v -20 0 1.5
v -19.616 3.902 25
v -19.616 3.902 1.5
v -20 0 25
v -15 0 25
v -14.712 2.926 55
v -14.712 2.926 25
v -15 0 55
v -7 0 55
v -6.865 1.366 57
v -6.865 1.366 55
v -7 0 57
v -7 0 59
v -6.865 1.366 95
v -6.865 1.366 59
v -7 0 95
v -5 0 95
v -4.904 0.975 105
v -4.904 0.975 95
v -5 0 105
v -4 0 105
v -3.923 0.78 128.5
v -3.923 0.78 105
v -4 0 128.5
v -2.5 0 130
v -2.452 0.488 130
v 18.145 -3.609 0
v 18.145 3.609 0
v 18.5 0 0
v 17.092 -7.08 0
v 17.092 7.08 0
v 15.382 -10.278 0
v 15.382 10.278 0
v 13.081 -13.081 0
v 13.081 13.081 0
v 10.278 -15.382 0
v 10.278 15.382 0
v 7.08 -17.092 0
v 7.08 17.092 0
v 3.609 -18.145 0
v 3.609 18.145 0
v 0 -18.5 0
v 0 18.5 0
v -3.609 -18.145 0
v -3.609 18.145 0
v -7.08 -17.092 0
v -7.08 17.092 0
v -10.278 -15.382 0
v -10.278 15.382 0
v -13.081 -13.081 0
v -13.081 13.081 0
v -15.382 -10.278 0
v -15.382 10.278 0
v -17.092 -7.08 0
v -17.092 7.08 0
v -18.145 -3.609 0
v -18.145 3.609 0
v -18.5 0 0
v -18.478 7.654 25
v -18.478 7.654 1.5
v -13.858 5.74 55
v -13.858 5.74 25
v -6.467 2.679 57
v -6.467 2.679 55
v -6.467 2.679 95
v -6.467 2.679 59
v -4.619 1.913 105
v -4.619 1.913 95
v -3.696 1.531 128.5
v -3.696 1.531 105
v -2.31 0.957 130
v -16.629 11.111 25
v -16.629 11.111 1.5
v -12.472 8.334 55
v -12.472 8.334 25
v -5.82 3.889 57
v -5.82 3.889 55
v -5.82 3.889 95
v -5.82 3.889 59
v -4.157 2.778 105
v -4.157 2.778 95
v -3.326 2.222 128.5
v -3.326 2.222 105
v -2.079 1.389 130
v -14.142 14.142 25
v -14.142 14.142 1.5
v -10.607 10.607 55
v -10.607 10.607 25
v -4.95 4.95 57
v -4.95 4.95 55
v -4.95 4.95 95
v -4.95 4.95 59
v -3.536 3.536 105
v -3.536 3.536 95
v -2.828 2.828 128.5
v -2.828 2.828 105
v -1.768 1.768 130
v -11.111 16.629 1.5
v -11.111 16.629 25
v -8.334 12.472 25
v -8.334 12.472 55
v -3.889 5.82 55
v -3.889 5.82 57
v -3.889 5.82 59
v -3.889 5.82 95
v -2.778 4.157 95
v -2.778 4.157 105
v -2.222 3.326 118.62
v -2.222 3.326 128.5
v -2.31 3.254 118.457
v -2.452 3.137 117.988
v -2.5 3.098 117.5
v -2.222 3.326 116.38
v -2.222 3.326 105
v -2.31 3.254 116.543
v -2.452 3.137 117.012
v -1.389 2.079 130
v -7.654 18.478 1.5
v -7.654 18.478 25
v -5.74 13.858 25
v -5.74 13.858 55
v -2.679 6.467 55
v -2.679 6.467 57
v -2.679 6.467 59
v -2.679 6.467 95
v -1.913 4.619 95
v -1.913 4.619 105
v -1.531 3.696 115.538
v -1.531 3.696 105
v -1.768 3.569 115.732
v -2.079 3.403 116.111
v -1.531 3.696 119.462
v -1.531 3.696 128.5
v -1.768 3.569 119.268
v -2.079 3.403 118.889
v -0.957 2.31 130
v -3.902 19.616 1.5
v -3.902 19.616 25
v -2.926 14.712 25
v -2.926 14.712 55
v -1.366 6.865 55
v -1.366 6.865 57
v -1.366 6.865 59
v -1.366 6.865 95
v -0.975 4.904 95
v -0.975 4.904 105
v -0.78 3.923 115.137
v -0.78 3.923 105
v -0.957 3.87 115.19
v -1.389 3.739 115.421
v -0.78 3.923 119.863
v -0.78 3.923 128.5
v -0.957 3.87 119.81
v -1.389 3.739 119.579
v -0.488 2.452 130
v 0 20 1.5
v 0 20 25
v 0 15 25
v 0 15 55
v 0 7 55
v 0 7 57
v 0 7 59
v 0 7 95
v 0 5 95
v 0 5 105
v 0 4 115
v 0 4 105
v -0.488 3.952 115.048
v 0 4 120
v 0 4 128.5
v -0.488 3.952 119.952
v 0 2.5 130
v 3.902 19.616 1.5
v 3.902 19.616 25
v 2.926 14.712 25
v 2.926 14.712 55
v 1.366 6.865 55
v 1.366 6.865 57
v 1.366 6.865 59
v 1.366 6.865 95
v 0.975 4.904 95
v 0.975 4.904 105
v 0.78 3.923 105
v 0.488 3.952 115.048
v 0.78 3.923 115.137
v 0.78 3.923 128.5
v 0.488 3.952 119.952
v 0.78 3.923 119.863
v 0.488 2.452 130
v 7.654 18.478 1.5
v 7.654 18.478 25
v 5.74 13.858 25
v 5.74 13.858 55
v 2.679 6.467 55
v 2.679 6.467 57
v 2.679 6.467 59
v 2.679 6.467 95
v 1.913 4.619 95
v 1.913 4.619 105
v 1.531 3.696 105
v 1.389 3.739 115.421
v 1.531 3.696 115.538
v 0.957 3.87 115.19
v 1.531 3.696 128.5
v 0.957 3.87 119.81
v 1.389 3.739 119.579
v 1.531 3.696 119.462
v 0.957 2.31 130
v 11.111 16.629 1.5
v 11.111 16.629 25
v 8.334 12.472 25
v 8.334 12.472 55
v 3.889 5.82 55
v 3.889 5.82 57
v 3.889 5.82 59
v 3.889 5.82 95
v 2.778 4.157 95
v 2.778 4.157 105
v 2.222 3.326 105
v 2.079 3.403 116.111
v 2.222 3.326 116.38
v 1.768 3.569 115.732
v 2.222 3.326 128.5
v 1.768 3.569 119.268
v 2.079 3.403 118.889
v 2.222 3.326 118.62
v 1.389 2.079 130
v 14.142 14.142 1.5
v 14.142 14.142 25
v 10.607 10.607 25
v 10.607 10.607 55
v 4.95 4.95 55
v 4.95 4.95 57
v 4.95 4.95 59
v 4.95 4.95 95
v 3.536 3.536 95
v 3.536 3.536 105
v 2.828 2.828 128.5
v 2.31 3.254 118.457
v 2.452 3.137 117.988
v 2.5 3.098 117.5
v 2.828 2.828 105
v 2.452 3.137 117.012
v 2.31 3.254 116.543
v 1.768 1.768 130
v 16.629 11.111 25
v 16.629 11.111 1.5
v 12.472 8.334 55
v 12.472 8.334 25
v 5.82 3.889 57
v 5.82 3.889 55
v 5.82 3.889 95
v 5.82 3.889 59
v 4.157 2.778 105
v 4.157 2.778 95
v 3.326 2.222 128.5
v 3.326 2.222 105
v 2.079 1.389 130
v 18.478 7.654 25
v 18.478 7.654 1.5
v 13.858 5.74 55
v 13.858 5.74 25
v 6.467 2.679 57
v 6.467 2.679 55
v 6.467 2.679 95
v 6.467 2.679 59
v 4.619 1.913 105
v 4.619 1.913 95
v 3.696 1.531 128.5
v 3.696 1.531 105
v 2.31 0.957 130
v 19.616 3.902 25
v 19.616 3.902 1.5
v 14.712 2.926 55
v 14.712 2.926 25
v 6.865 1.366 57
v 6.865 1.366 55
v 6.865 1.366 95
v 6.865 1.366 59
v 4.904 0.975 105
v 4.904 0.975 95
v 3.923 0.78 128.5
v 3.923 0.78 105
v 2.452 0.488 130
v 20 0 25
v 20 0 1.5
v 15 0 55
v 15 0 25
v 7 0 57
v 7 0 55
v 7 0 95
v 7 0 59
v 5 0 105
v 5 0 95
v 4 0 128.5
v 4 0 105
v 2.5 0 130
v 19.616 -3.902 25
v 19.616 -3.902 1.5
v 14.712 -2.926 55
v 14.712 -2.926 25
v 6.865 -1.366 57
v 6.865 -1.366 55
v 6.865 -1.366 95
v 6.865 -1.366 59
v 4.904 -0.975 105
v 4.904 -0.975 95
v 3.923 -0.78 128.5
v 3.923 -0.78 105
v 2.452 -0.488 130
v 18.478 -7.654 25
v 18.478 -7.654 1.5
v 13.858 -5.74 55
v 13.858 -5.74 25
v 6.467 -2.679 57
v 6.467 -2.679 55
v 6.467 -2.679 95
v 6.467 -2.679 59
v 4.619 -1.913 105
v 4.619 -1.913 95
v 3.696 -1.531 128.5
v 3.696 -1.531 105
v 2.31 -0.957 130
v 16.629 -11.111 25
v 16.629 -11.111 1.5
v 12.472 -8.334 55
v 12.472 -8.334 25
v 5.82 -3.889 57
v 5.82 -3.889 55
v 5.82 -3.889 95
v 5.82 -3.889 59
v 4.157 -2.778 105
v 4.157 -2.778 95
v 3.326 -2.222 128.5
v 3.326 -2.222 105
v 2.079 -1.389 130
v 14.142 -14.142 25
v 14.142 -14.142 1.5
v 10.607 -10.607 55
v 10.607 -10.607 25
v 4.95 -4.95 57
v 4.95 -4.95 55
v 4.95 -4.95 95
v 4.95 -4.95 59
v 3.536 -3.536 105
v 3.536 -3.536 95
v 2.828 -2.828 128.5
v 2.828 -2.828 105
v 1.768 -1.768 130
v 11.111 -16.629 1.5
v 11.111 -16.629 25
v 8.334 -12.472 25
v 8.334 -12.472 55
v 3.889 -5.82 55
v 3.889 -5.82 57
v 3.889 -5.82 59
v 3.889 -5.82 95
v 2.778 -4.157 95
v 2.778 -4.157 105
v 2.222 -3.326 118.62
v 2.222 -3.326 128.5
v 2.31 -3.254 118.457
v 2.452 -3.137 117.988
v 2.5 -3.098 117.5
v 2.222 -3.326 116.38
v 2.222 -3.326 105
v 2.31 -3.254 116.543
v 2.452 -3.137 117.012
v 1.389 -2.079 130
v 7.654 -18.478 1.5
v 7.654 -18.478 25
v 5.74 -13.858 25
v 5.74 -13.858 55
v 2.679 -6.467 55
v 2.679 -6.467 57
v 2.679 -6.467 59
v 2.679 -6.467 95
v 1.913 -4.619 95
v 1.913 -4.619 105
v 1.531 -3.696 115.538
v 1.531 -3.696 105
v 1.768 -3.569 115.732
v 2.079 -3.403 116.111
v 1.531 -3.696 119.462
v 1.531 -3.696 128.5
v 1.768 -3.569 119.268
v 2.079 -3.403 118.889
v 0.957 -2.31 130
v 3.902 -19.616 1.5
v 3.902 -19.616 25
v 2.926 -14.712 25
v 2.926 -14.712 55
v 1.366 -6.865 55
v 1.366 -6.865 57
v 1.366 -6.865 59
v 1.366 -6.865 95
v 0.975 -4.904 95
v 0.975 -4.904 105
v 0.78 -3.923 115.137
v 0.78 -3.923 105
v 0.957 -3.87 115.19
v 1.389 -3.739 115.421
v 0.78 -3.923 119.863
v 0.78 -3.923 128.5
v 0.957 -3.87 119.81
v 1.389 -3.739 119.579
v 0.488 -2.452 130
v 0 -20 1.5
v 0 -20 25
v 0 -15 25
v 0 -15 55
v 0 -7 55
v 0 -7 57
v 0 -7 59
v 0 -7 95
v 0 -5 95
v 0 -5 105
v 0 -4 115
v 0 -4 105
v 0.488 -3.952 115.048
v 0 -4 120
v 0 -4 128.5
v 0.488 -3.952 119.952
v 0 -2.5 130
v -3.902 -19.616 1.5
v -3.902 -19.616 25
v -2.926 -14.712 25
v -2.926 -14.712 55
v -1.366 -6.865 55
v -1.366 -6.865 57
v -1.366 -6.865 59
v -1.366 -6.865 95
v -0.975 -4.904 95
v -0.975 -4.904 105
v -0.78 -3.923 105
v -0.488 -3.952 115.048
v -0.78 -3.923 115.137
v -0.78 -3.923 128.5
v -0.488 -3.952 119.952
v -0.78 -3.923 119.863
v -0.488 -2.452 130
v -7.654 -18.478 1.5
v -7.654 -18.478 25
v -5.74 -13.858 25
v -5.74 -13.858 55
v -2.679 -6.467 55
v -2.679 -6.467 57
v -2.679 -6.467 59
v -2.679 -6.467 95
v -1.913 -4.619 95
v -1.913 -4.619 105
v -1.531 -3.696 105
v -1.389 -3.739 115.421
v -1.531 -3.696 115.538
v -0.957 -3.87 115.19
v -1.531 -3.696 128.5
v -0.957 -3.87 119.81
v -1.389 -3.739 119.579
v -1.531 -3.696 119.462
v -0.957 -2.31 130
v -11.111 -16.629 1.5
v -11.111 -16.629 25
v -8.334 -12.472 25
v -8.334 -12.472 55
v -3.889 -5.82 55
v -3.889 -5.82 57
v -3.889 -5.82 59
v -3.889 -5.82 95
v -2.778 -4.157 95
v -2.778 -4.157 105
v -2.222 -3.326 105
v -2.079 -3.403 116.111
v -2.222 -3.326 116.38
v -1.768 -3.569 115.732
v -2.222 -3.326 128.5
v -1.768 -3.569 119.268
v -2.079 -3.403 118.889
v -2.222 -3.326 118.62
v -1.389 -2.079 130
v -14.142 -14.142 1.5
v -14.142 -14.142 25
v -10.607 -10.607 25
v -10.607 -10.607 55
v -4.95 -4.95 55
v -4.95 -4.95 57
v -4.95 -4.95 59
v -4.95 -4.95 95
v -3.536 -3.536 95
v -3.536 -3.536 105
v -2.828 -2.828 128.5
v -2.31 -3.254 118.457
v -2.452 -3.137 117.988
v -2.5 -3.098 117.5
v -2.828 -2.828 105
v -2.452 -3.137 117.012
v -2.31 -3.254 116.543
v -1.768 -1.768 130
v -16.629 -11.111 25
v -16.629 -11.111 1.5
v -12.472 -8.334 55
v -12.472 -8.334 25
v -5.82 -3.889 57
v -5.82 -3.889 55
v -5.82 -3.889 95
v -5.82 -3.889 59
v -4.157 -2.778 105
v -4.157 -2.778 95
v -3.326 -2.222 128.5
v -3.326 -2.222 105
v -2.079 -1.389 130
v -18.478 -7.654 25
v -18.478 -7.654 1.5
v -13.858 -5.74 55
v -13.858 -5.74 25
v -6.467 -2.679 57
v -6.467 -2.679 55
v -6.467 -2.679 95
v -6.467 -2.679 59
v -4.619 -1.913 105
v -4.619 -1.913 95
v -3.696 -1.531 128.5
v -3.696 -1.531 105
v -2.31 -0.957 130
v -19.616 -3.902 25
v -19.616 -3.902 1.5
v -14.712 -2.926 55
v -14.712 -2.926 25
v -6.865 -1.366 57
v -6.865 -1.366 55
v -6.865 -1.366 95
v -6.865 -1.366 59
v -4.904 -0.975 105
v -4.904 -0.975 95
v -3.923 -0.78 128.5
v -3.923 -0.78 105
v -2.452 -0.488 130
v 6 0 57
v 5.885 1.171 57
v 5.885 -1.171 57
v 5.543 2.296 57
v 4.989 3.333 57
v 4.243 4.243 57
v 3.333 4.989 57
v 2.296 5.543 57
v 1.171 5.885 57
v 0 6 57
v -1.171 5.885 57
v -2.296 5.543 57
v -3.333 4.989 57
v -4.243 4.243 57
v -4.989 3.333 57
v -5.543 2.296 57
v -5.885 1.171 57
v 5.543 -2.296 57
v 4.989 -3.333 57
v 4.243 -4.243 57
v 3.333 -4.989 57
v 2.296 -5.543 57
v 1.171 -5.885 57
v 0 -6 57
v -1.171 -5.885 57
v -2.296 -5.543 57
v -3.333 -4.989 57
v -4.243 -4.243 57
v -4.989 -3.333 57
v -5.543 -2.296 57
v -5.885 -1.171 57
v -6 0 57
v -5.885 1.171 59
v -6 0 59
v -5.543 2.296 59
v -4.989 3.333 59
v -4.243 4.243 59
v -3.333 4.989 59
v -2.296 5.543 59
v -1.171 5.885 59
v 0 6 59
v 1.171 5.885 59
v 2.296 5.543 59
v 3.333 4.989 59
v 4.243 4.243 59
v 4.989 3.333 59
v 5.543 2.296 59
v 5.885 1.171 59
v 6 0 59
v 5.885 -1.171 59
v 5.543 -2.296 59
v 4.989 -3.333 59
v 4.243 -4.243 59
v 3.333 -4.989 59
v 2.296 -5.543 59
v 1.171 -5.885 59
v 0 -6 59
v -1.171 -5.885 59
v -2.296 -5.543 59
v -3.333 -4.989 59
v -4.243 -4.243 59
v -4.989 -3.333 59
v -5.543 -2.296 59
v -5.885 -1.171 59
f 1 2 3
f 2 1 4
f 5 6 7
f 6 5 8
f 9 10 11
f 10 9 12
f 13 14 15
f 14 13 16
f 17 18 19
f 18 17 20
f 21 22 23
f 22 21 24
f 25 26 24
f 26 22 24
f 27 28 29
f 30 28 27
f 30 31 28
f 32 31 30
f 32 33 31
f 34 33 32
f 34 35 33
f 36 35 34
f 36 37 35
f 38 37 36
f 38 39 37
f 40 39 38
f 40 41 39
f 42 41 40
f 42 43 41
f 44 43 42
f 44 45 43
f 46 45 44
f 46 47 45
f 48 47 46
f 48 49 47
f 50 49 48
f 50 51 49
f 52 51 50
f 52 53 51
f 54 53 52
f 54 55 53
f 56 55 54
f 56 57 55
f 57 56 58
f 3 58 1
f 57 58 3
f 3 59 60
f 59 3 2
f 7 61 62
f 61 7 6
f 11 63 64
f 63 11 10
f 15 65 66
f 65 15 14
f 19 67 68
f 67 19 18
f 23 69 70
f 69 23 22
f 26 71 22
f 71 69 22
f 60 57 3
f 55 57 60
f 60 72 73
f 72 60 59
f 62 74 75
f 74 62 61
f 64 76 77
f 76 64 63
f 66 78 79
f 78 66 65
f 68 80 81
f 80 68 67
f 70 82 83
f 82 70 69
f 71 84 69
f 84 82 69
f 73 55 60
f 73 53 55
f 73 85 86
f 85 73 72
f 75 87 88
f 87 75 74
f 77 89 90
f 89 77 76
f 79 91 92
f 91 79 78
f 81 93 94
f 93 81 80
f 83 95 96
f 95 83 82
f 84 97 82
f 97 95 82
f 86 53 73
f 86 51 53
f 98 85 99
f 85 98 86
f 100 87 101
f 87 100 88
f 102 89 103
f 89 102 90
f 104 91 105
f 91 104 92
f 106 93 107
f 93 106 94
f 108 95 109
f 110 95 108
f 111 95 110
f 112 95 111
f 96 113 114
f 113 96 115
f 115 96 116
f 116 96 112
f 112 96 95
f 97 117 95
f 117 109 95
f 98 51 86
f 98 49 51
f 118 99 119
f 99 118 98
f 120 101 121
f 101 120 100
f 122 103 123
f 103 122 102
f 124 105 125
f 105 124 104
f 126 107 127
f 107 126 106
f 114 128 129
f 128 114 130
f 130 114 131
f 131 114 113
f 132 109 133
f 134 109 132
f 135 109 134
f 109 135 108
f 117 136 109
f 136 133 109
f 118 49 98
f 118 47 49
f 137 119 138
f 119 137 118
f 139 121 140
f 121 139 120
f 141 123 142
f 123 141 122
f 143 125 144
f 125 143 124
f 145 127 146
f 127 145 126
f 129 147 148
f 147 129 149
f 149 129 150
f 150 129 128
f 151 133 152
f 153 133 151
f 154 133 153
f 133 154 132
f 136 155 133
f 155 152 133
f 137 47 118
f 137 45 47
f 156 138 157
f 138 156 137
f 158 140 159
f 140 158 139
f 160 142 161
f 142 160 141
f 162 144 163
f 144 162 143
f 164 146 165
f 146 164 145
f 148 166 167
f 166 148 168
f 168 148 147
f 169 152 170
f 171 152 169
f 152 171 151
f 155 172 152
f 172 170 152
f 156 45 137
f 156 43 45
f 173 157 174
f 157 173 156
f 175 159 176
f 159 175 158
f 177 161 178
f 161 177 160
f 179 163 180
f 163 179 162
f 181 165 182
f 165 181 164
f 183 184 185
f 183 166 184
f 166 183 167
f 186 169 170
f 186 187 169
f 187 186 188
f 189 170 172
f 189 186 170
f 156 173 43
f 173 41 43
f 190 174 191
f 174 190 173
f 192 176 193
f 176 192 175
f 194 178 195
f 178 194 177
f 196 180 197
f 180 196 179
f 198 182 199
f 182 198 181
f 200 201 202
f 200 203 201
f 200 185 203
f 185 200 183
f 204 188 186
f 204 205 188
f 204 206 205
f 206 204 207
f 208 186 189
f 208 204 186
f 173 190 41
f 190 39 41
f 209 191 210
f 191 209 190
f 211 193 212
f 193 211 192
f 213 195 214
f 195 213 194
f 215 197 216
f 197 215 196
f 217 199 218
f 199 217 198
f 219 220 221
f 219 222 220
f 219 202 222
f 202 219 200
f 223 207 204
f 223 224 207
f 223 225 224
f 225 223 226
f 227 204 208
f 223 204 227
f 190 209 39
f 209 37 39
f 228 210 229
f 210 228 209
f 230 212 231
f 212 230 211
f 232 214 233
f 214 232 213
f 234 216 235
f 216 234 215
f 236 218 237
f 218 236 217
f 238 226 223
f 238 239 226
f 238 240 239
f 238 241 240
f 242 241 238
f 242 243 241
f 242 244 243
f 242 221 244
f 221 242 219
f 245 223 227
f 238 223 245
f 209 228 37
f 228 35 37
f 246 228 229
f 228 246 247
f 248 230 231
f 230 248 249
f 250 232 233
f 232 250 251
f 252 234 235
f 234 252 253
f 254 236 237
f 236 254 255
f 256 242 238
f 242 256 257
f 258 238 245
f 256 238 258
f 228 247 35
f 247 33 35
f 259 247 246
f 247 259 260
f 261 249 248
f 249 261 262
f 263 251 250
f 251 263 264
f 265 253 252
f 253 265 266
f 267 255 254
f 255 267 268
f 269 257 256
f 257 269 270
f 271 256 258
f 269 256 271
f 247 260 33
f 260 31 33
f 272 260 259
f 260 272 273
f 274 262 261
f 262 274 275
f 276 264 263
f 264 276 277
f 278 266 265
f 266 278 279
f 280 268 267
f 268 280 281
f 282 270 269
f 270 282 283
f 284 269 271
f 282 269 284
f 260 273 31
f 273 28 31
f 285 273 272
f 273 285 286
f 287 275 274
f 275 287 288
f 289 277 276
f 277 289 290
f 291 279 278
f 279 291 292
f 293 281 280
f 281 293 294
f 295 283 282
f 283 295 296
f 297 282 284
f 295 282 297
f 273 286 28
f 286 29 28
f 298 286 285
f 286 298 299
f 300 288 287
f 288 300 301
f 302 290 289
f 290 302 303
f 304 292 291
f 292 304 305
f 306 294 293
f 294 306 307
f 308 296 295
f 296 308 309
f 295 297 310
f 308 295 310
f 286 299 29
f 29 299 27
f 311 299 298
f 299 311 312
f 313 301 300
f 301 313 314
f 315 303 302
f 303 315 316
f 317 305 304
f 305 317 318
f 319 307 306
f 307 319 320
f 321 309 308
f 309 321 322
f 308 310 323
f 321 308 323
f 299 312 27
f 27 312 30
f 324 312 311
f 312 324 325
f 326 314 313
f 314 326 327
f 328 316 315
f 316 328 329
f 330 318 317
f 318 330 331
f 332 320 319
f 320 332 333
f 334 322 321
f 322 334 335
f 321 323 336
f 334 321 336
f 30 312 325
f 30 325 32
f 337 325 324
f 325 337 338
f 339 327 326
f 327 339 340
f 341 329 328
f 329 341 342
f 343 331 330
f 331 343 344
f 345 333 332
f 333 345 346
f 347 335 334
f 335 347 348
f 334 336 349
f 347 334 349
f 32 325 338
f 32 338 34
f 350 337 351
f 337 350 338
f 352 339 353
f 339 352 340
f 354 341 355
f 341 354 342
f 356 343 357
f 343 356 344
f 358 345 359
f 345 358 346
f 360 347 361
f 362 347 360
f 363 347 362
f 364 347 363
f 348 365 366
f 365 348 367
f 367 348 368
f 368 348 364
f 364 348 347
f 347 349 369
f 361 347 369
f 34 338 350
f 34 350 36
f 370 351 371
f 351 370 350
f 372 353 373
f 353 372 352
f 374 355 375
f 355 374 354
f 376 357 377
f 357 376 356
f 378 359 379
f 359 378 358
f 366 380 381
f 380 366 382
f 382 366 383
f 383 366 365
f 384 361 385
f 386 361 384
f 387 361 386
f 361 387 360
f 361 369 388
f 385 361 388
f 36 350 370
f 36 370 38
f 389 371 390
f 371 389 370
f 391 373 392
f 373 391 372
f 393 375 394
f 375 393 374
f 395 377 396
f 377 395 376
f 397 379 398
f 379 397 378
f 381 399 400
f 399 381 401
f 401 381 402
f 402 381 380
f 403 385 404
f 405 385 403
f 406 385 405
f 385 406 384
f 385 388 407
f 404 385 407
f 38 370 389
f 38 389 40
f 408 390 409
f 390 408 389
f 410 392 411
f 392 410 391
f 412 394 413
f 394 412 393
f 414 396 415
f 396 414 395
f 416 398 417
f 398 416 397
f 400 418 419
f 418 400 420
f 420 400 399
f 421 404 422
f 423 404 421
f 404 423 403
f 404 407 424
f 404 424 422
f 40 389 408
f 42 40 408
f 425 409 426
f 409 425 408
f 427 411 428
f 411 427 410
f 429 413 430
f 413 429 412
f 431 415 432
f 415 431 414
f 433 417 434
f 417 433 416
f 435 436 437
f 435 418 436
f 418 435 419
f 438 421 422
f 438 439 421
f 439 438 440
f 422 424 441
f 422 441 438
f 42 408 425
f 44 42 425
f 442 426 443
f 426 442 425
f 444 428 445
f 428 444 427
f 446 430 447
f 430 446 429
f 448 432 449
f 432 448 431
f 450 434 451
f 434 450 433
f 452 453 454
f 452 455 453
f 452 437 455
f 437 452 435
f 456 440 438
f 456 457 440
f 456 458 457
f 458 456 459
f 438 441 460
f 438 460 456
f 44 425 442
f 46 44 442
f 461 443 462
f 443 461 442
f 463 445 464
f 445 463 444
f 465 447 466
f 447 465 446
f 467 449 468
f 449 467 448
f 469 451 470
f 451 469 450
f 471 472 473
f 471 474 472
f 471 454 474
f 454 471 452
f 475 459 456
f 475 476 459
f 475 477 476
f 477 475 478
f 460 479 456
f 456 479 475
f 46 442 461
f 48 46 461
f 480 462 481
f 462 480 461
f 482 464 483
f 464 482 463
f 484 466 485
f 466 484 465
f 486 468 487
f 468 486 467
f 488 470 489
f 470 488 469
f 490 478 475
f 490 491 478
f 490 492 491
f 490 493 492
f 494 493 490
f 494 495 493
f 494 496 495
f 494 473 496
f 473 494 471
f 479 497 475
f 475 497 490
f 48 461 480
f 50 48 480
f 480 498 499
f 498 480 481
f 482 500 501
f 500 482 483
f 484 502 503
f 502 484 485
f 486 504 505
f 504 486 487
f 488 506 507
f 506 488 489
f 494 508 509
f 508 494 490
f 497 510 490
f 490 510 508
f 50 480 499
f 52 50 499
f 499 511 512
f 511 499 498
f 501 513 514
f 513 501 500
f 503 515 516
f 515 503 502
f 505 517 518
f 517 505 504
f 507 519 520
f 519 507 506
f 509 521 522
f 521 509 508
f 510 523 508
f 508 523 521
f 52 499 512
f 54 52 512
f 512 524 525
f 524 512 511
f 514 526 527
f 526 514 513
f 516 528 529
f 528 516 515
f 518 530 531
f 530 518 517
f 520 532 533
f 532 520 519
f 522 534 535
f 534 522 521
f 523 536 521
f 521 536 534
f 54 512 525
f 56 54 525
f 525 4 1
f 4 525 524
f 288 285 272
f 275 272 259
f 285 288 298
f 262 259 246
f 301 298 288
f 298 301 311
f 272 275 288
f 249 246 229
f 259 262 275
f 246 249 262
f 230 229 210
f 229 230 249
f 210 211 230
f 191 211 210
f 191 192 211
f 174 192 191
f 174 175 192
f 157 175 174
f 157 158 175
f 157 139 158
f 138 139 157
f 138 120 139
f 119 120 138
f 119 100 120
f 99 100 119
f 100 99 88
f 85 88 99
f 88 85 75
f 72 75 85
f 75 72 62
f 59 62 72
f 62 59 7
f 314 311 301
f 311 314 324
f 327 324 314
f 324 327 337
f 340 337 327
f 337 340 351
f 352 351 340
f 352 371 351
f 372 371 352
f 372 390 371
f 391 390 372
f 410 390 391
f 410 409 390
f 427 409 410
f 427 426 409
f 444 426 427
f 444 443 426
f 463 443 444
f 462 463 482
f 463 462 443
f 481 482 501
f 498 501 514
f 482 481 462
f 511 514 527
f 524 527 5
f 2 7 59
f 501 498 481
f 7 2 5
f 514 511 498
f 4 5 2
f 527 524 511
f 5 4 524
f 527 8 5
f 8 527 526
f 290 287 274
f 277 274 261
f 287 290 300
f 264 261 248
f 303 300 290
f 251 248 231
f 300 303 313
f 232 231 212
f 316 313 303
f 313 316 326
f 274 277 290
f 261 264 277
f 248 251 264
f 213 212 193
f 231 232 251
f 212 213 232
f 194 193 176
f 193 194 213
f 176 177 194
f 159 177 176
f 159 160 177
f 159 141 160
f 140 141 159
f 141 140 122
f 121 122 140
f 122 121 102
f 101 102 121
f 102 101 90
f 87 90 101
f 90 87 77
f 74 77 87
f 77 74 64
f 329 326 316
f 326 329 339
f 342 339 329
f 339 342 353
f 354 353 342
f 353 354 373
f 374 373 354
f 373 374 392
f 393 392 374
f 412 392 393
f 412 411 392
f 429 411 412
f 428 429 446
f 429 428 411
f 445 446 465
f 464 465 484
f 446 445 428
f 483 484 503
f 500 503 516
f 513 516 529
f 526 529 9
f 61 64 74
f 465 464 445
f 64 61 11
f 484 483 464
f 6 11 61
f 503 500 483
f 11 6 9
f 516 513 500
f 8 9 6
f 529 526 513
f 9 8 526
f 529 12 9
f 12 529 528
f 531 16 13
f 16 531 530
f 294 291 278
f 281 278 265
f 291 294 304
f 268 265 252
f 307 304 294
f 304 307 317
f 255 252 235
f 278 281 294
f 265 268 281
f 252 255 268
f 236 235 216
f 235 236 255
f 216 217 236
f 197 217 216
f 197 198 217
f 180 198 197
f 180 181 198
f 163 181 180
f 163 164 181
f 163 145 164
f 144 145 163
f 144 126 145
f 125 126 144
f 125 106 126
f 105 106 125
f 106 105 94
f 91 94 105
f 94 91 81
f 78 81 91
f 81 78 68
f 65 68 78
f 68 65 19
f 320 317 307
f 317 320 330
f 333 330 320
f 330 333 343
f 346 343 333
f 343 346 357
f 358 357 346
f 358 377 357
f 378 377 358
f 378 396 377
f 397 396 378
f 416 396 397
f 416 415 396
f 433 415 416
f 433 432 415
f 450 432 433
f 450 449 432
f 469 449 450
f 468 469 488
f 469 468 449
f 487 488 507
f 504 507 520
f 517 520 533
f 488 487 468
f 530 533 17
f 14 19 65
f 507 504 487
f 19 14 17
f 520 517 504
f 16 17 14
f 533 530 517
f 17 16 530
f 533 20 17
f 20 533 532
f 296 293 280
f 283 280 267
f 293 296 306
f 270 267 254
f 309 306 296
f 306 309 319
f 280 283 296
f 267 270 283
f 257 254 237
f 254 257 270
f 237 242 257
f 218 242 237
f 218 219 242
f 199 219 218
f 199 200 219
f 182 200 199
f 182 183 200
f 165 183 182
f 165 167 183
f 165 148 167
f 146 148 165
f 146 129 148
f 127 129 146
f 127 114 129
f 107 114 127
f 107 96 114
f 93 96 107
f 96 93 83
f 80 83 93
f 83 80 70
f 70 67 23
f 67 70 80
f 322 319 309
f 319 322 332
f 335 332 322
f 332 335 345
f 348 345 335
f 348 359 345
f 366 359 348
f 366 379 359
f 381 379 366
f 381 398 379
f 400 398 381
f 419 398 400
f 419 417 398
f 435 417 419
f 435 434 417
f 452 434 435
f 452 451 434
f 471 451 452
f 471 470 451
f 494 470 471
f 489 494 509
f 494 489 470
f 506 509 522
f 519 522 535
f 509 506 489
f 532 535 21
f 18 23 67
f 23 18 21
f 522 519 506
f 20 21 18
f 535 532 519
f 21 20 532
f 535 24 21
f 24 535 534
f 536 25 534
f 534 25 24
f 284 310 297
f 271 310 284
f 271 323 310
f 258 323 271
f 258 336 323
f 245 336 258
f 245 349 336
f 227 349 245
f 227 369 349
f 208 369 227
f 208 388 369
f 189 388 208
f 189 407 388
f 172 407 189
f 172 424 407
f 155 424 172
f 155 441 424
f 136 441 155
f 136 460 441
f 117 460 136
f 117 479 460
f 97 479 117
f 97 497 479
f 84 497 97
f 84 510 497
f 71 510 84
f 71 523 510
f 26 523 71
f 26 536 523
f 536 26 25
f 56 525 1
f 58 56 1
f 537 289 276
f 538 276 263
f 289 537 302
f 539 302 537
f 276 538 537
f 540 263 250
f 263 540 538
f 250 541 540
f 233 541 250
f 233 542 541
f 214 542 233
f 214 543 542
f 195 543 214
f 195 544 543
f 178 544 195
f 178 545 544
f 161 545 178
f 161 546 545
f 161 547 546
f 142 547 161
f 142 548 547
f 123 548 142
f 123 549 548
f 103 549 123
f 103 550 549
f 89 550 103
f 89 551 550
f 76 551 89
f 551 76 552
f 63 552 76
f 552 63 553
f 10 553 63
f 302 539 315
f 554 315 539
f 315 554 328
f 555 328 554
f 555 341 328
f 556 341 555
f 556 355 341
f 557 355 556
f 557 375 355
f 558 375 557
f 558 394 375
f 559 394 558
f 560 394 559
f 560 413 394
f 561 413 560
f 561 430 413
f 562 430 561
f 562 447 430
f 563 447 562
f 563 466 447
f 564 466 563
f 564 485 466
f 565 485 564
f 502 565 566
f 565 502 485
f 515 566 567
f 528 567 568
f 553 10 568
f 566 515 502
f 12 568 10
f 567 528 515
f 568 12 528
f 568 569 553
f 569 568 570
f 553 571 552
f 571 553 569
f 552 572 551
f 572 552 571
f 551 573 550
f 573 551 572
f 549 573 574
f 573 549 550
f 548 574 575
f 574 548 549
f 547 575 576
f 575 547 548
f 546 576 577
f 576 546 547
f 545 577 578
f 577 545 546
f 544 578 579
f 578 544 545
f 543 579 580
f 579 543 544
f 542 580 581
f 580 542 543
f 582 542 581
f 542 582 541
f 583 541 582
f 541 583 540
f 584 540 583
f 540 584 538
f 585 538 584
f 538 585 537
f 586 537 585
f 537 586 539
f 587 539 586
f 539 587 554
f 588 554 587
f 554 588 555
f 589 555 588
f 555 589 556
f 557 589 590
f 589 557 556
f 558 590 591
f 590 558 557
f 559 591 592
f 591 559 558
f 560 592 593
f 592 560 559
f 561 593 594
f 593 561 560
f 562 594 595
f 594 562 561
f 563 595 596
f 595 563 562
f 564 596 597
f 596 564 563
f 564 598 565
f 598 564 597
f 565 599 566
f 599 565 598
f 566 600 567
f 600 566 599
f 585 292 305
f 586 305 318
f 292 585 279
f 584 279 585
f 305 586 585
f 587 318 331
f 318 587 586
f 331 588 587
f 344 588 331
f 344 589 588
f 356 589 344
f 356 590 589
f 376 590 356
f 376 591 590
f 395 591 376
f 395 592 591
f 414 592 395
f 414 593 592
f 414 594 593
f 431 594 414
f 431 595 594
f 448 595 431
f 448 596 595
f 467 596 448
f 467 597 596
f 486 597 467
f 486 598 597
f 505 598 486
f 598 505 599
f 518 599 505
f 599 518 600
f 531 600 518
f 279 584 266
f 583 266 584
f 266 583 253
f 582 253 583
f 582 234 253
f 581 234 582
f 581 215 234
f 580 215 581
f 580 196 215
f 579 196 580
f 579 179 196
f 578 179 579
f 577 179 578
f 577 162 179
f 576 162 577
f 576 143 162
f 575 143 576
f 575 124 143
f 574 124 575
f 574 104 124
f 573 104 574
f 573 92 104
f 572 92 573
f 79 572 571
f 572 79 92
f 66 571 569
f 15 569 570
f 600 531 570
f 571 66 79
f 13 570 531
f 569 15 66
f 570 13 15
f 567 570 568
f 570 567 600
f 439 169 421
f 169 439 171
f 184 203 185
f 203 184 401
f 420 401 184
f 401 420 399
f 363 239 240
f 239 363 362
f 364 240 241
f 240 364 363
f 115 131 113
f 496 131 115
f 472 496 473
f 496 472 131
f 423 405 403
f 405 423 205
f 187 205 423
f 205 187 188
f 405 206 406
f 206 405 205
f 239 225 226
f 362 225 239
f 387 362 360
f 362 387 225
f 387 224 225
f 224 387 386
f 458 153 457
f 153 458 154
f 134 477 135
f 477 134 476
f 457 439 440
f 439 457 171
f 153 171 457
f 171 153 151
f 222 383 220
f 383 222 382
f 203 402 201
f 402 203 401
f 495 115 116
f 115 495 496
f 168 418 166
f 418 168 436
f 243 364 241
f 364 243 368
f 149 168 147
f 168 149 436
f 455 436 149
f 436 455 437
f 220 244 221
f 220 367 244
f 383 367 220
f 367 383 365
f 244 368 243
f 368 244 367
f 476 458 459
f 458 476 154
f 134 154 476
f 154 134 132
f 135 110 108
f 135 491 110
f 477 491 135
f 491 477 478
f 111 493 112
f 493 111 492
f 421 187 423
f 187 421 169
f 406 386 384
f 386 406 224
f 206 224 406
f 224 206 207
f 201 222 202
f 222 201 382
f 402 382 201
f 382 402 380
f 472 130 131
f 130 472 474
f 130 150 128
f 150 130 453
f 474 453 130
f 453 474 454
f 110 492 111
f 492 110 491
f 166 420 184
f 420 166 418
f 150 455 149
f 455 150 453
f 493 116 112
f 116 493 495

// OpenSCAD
$fn = 32;

// ----------------------------------------------------------------------
// Stepped shaft: diameters 40, 30, 14, 10, 8 mm, 130 mm long
// ----------------------------------------------------------------------

// --- parameters (mm) ---
d1 = 40;                  // step 1 diameter
len1 = 25;                // step 1 length
d2 = 30;                  // step 2 diameter
len2 = 30;                // step 2 length
d3 = 14;                  // step 3 diameter
len3 = 40;                // step 3 length
d4 = 10;                  // step 4 diameter
len4 = 10;                // step 4 length
d5 = 8;                   // step 5 diameter
len5 = 25;                // step 5 length
total = 130;              // overall length
chamfer = 1.5;            // end chamfer
groove_r = 7;             // groove radius
groove_z = 57;            // groove position from the end
groove_w = 2;             // groove width
groove_d = 1;             // groove depth
cross_d = 5;              // cross pin hole
cross_z = 117.5;          // cross hole position

/* closed turning profile: x is the radius, y is the length */
profile = [[0, 0], [20 - chamfer, 0], [20, chamfer], [20, 25], [15, 25], [15, 55], [7, 55], [7, 95], [5, 95], [5, 105], [4, 105], [4, 128.5], [2.5, 130], [0, 130]];

difference() {
  rotate_extrude() polygon(profile);
  /* circlip groove just behind the shoulder */
  rotate_extrude() translate([groove_r - groove_d, groove_z]) square([groove_d + 1, groove_w]);
  /* cross pin hole through the small step */
  translate([0, 0, cross_z]) rotate([90, 0, 0]) cylinder(h = d5 + 4, d = cross_d, center = true);
}
